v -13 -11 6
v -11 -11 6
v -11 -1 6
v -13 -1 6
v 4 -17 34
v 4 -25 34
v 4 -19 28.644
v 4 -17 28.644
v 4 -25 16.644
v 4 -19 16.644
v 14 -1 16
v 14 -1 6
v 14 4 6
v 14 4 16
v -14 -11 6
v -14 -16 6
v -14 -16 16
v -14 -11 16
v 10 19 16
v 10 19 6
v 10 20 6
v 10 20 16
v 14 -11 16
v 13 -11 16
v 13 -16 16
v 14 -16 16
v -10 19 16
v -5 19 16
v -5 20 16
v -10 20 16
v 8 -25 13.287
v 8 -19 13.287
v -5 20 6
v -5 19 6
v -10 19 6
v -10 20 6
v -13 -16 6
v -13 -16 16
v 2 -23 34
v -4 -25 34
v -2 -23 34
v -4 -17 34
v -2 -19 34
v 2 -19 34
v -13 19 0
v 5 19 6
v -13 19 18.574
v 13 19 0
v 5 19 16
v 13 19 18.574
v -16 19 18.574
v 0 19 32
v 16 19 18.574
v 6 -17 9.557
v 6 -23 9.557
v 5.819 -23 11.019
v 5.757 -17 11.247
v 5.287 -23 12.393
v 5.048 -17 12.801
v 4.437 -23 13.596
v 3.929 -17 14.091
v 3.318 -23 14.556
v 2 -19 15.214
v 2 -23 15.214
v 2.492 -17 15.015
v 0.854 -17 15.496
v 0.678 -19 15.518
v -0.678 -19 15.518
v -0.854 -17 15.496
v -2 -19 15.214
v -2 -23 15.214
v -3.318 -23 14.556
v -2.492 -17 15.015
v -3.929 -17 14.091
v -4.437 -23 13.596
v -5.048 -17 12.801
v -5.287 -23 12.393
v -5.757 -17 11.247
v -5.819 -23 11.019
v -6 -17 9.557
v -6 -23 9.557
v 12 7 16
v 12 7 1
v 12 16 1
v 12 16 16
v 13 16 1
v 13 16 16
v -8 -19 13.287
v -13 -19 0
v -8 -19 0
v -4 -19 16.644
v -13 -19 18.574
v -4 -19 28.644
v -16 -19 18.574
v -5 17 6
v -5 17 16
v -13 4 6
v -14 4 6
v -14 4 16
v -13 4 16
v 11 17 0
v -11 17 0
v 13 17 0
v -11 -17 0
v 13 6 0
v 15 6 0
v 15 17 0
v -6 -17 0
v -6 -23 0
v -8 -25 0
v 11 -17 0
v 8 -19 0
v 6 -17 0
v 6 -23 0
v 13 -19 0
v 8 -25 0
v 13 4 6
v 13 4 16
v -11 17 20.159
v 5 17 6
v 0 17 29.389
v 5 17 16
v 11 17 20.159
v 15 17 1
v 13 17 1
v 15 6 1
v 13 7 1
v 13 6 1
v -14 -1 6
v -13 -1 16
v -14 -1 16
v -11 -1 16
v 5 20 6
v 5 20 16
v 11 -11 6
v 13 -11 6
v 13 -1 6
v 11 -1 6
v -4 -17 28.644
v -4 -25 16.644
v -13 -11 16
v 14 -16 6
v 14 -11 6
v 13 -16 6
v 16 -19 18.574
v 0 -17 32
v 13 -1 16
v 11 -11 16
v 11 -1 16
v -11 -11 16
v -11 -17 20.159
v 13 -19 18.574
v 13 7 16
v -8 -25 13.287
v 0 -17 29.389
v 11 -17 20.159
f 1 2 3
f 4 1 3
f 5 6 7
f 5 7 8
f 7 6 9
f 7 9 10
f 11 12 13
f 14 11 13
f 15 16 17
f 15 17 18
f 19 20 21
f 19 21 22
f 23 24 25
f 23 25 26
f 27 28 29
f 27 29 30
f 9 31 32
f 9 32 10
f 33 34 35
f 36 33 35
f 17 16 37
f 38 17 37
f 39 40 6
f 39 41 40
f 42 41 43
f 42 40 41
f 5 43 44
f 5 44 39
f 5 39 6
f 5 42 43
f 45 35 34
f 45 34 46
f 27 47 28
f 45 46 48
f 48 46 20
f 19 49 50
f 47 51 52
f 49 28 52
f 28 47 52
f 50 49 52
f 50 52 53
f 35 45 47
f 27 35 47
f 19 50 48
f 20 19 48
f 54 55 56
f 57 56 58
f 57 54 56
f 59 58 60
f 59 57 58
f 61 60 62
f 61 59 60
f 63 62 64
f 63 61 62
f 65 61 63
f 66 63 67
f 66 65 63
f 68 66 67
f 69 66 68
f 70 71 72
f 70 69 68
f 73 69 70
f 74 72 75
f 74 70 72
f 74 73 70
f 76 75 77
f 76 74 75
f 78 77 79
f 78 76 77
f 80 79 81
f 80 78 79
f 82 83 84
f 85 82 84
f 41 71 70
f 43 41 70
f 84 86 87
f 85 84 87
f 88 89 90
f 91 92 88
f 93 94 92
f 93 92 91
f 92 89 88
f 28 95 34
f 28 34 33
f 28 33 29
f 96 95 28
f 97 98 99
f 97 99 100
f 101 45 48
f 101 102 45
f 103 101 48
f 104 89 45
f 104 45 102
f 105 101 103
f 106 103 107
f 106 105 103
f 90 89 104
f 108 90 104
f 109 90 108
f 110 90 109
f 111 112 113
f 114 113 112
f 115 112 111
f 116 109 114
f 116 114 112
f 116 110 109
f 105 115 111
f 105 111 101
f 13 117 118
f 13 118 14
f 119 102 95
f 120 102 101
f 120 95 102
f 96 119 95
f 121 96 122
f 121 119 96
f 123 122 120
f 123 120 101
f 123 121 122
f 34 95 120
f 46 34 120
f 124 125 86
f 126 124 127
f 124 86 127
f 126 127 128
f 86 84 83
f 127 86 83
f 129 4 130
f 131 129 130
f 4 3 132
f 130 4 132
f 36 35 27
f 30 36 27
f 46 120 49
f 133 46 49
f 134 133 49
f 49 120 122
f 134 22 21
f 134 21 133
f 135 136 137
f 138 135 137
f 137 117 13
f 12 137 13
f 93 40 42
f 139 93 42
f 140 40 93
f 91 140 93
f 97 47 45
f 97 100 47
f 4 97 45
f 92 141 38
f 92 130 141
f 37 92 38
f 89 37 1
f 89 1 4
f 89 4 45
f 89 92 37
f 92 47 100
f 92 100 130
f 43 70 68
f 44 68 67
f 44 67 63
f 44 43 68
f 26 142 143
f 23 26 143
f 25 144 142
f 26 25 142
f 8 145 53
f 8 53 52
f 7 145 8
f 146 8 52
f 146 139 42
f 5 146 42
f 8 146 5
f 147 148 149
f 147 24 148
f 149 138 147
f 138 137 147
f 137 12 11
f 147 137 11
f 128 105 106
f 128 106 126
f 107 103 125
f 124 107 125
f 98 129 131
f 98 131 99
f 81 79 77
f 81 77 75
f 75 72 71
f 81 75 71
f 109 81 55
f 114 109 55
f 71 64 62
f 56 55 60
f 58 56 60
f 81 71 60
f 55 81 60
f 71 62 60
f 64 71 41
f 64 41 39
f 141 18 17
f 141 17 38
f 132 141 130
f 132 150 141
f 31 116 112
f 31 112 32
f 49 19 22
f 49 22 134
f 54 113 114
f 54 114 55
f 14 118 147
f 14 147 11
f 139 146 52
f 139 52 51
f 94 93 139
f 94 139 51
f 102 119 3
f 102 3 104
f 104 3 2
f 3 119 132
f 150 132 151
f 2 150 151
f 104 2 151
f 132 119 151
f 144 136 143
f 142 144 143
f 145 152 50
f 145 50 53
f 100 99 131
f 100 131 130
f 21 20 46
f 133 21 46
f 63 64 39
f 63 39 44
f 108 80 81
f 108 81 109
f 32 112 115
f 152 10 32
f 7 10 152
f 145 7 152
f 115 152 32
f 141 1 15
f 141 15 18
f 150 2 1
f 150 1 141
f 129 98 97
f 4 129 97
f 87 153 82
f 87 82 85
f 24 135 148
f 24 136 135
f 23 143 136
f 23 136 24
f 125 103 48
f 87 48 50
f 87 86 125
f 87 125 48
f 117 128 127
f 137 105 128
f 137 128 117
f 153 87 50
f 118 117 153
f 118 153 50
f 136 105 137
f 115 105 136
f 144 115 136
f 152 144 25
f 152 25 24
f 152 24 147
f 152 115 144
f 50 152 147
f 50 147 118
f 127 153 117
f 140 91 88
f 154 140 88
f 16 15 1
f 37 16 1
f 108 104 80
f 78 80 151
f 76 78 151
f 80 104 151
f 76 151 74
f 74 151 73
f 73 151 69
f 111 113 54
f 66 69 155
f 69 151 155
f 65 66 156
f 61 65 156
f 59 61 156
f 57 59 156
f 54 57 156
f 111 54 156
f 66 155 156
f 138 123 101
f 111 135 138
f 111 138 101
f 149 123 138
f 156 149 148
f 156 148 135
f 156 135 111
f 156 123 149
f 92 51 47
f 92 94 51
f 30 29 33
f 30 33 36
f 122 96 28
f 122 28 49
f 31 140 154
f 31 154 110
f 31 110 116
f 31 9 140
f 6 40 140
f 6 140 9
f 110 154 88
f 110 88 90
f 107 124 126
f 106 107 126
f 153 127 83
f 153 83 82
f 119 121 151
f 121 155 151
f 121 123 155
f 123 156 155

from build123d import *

# Parameters (mm, degrees)
F1_DEPTH       = 19
F2_W           = 10
F2_H           = 10
F3_DEPTH       = 19.001
F4_W           = 28
F4_H           = 20
F5_DEPTH       = 10
F6_W           = 10
F6_H           = 10
F7_DEPTH       = 16.001
F7_DEPTH_BACK  = 16.001
F8_W           = 5
F8_H           = 10
F9_DEPTH       = 1
F10_W          = 22
F10_H          = 34
F11_DEPTH      = 18.5754059012
F13_DEPTH      = 17
F13_DEPTH_BACK = 17
F14_W          = 8
F14_H          = 8
F15_DEPTH      = 34
F17_DEPTH      = 8
F18_W          = 4
F18_H          = 4
F19_DEPTH      = 34.001
F21_DEPTH      = 23
F22_W          = 9
F22_H          = 16
F23_DEPTH      = 1
F24_W          = 11
F24_H          = 1
F25_DEPTH      = 4


with BuildPart() as f1:
    # F0 (on Front) → F1 (new body, symmetric)
    with BuildSketch(Plane.XZ):
        Polygon((-13, 18.5744059012), (-13, 0), (13, 0), (13, 18.5744059012), (16, 18.5744059012), (0, 32), (-16, 18.5744059012), align=None)
    extrude(amount=F1_DEPTH, both=True)

    # F2 (on Front) → F3 (cut, through all)
    with BuildSketch(Plane.XZ):
        with Locations((0, 11)):
            Rectangle(F2_W, F2_H)
    extrude(amount=-F3_DEPTH, mode=Mode.SUBTRACT)

    # F4 (on face) → F5 (join, through all)
    with BuildSketch(Plane.XY.offset(6)):
        with Locations((0, -6)):
            Rectangle(F4_W, F4_H)
    extrude(amount=F5_DEPTH)

    # F6 (on Right) → F7 (cut, two sides)
    with BuildSketch(Plane.YZ) as f7_sk:
        with Locations((-6, 11)):
            Rectangle(F6_W, F6_H)
    extrude(amount=-F7_DEPTH, mode=Mode.SUBTRACT)
    extrude(f7_sk.sketch, amount=F7_DEPTH_BACK, mode=Mode.SUBTRACT)

    # F8 (on face) → F9 (join)
    with BuildSketch(Plane(origin=(0, 19, 0), x_dir=(-1, 0, 0), z_dir=(0, 1, 0))):
        with Locations((-7.5, 11)):
            Rectangle(F8_W, F8_H)
        with Locations((7.5, 11)):
            Rectangle(F8_W, F8_H)
    extrude(amount=F9_DEPTH)

    # F10 (on face) → F11 (cut, through all)
    with BuildSketch(Plane(origin=(0, 0, 18.5744059012), x_dir=(1, 0, 0), z_dir=(0, 0, -1))):
        Rectangle(F10_W, F10_H)
    extrude(amount=F11_DEPTH, mode=Mode.SUBTRACT)

    # F12 (on Front) → F13 (cut, two sides)
    with BuildSketch(Plane.XZ) as f13_sk:
        Polygon((-11, 20.1590894784), (-11, 18.5744059012), (11, 18.5744059012), (11, 20.1590894784), (0, 29.3891854213), align=None)
    extrude(amount=-F13_DEPTH, mode=Mode.SUBTRACT)
    extrude(f13_sk.sketch, amount=F13_DEPTH_BACK, mode=Mode.SUBTRACT)

    # F14 (on Top) → F15 (join)
    with BuildSketch(Plane.XY):
        with Locations((0, -21)):
            Rectangle(F14_W, F14_H)
    extrude(amount=F15_DEPTH)

    # F16 (on face) → F17 (join, through all)
    with BuildSketch(Plane.XZ.offset(25)):
        Polygon((8, 13.2872029506), (0, 20), (-8, 13.2872029506), (-8, 0), (8, 0), align=None)
    extrude(amount=-F17_DEPTH)

    # F18 (on face) → F19 (cut, through all)
    with BuildSketch(Plane.XY.offset(34)):
        with Locations((0, -21)):
            Rectangle(F18_W, F18_H)
    extrude(amount=-F19_DEPTH, mode=Mode.SUBTRACT)

    # F20 (on Front) → F21 (cut, through all)
    with BuildSketch(Plane.XZ):
        with BuildLine():
            ThreePointArc((6, 9.5567416853), (0, 15.5567416853), (-6, 9.5567416853))
            Line((-6, 9.5567416853), (-6, 0))
            Line((-6, 0), (6, 0))
            Line((6, 0), (6, 9.5567416853))
        make_face()
    extrude(amount=F21_DEPTH, mode=Mode.SUBTRACT)

    # F22 (on face) → F23 (cut)
    with BuildSketch(Plane.YZ.offset(13)):
        with Locations((11.5, 8)):
            Rectangle(F22_W, F22_H)
    extrude(amount=-F23_DEPTH, mode=Mode.SUBTRACT)

    # F24 (on face) → F25 (join)
    with BuildSketch(Plane(origin=(11, 0, 0), x_dir=(0, -1, 0), z_dir=(-1, 0, 0))):
        with Locations((-11.5, 0.5)):
            Rectangle(F24_W, F24_H)
    extrude(amount=-F25_DEPTH)


solid = f1.part
